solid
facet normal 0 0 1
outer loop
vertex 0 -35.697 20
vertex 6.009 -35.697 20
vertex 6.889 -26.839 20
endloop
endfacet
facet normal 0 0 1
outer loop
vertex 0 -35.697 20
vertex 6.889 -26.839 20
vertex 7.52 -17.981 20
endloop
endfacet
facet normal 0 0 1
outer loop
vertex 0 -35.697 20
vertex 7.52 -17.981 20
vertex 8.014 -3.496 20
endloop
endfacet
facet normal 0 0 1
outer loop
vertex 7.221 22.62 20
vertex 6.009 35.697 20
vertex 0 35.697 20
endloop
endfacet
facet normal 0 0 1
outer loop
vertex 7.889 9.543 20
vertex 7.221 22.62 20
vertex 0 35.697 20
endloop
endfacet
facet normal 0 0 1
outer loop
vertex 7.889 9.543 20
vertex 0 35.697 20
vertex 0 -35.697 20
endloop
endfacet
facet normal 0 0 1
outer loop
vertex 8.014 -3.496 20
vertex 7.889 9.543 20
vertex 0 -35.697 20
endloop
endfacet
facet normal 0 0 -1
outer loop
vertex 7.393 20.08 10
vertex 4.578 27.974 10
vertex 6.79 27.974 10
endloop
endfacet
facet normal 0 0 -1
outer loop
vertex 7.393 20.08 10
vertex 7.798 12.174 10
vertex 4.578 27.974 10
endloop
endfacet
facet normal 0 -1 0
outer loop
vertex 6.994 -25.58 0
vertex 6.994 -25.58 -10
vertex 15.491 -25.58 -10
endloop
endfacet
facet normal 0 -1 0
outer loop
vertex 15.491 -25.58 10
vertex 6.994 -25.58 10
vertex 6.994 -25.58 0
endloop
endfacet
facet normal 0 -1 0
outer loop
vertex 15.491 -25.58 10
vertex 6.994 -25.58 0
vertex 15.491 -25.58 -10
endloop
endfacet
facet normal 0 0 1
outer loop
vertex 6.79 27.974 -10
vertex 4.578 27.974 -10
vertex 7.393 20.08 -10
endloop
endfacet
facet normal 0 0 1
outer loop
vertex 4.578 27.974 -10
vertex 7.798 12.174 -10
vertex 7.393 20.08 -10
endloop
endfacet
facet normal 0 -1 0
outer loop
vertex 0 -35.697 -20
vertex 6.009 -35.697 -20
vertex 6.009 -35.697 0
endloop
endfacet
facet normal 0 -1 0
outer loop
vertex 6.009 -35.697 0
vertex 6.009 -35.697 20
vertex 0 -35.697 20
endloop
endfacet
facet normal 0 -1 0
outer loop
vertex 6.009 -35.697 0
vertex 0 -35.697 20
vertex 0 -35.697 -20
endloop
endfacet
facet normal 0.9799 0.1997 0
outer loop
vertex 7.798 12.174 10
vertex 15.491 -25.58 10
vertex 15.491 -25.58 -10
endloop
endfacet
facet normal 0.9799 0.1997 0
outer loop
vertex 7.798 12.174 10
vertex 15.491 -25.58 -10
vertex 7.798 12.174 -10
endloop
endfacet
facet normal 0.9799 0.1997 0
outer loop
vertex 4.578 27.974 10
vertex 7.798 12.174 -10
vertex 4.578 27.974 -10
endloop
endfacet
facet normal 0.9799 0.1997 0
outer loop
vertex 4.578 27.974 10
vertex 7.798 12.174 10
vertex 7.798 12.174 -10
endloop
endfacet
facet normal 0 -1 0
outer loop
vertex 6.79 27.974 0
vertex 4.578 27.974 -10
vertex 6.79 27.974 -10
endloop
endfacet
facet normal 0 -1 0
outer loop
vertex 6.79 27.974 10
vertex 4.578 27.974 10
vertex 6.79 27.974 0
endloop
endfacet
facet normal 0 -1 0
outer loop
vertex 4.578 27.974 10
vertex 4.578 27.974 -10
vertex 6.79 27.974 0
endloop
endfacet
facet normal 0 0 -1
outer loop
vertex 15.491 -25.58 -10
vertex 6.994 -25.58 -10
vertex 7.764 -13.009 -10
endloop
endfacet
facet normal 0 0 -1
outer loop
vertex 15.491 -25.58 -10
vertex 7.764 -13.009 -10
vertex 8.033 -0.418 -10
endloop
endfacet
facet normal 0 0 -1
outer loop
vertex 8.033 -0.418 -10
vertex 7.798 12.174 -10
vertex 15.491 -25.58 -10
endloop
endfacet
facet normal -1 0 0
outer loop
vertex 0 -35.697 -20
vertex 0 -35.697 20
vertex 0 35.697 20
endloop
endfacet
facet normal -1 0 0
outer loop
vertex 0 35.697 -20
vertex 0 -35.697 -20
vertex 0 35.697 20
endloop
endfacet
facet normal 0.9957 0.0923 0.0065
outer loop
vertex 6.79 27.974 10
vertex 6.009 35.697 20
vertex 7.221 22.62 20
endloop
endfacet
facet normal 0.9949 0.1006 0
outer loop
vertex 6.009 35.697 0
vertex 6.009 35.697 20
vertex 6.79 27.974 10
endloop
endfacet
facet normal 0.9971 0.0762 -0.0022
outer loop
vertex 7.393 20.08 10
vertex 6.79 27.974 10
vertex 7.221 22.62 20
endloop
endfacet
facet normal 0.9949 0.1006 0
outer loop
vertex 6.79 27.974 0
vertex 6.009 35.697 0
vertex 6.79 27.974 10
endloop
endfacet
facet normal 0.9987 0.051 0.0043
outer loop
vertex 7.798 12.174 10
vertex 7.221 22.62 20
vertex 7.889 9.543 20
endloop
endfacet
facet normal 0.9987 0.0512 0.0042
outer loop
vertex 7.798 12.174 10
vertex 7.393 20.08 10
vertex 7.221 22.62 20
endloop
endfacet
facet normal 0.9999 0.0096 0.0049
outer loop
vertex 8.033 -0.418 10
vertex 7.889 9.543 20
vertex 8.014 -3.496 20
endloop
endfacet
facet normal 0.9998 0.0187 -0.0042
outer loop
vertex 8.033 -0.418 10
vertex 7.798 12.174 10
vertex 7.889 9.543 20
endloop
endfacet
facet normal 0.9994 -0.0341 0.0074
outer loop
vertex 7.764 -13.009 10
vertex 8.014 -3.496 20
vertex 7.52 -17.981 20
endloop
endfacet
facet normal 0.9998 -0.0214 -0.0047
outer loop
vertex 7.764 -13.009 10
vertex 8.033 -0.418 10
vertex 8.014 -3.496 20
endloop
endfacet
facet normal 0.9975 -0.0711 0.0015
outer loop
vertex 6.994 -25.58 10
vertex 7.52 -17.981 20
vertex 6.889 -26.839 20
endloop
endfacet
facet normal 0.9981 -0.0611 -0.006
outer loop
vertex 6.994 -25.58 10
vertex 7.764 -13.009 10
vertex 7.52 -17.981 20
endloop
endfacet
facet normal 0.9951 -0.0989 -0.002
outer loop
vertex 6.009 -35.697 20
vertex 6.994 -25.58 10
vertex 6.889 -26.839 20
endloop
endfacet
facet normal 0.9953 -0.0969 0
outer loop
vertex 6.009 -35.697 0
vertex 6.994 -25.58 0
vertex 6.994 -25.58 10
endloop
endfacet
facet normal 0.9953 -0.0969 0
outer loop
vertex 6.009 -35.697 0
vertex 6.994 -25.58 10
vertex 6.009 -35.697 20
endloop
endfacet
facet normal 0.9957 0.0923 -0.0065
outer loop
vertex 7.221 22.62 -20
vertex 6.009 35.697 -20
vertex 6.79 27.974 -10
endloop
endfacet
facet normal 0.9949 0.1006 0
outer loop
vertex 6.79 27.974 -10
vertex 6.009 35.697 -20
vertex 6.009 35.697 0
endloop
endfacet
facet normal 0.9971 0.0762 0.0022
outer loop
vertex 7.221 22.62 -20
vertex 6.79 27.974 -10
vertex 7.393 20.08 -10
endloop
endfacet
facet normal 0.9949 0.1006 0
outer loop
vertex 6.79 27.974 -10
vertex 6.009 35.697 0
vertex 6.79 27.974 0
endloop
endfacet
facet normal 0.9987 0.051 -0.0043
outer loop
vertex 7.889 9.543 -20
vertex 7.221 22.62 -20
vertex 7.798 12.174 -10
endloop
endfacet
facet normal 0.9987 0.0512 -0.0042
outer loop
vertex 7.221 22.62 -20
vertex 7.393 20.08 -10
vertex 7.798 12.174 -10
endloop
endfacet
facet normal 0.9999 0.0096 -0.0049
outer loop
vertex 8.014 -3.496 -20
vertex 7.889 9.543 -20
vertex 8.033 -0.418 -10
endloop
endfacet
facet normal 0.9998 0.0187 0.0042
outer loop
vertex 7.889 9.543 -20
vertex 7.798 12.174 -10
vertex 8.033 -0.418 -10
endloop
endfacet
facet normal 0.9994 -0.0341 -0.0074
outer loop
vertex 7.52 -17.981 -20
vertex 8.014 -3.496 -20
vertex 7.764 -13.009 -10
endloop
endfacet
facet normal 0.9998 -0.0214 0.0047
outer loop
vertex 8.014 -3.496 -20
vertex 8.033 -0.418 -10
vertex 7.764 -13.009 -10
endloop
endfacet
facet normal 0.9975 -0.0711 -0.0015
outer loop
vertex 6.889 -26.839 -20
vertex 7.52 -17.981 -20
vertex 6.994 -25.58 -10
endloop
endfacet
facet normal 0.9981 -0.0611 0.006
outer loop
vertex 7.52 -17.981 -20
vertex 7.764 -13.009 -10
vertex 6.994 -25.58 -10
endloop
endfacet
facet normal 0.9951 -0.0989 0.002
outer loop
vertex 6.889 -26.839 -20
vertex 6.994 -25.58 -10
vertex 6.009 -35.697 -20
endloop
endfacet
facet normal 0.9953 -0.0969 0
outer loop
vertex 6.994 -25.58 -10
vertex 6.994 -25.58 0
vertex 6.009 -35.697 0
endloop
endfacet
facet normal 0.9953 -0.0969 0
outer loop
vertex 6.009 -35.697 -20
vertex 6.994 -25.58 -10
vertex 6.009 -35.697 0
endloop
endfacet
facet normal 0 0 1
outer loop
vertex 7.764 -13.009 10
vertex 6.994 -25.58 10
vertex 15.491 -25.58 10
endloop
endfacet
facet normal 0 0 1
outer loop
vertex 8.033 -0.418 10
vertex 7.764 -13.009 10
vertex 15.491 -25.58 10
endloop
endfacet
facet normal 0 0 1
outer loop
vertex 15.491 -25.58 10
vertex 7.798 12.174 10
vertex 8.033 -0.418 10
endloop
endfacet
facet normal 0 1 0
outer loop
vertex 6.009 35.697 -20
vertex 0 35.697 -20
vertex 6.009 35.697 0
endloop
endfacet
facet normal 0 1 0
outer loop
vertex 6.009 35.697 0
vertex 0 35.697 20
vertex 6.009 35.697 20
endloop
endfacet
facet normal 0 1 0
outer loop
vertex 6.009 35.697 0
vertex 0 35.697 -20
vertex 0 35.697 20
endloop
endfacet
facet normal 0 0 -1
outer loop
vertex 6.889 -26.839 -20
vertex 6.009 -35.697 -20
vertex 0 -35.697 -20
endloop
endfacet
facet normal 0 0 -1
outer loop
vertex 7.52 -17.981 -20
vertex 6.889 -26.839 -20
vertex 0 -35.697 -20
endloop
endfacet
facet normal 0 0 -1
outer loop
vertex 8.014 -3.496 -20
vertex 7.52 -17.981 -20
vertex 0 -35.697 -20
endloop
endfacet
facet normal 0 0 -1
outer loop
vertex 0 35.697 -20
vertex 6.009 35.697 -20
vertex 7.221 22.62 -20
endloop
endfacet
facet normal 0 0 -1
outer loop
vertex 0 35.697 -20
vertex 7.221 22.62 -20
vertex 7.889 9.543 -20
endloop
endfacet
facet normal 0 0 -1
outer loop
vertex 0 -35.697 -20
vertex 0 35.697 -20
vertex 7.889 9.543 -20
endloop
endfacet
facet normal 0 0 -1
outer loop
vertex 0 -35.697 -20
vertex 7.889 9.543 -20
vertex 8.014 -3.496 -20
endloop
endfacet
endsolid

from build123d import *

# Parameters (mm, degrees)
BOSS_EXTRUDE1_DEPTH      = 20
BOSS_EXTRUDE1_DEPTH_BACK = 20
CUT_EXTRUDE1_DEPTH       = 10
CUT_EXTRUDE1_DEPTH_BACK  = 10
SKETCH4_W                = 10.912387574
SKETCH4_H                = 53.553398504
BOSS_EXTRUDE2_DEPTH      = 10
BOSS_EXTRUDE2_DEPTH_BACK = 10


with BuildPart() as part:
    # Sketch2 → Boss-Extrude1 (new, two sides: drawn at the far end of the back side and taken through both)
    with BuildSketch(Plane.XY.offset(-BOSS_EXTRUDE1_DEPTH_BACK)):
        with BuildLine():
            Line((0, -35.697454944), (0, 35.697454944))
            Line((0, 35.697454944), (6.009448328, 35.697454944))
            add(Edge.make_bspline(
                [(6.009448328, 35.697454944), (10.056825281, 0), (6.009448328, -35.697454944)],
                knots=[0, 0, 0, 1, 1, 1], degree=2))
            Line((6.009448328, -35.697454944), (0, -35.697454944))
        make_face()
    extrude(amount=BOSS_EXTRUDE1_DEPTH + BOSS_EXTRUDE1_DEPTH_BACK)

    # Sketch4 → Cut-Extrude1 (cut, two sides: drawn at the far end of the back side and taken through both)
    with BuildSketch(Plane.XY.offset(-CUT_EXTRUDE1_DEPTH_BACK)):
        with Locations((10.034480552, 1.197125595)):
            Rectangle(SKETCH4_W, SKETCH4_H)
    extrude(amount=CUT_EXTRUDE1_DEPTH + CUT_EXTRUDE1_DEPTH_BACK, mode=Mode.SUBTRACT)

    # Sketch3 → Boss-Extrude2 (add, two sides: drawn at the far end of the back side and taken through both)
    with BuildSketch(Plane.XY.offset(-BOSS_EXTRUDE2_DEPTH_BACK)):
        Polygon((4.578286765, 27.973824847), (4.578286765, -25.579573657), (15.490674339, -25.579573657), align=None)
    extrude(amount=BOSS_EXTRUDE2_DEPTH + BOSS_EXTRUDE2_DEPTH_BACK)


solid = part.part
